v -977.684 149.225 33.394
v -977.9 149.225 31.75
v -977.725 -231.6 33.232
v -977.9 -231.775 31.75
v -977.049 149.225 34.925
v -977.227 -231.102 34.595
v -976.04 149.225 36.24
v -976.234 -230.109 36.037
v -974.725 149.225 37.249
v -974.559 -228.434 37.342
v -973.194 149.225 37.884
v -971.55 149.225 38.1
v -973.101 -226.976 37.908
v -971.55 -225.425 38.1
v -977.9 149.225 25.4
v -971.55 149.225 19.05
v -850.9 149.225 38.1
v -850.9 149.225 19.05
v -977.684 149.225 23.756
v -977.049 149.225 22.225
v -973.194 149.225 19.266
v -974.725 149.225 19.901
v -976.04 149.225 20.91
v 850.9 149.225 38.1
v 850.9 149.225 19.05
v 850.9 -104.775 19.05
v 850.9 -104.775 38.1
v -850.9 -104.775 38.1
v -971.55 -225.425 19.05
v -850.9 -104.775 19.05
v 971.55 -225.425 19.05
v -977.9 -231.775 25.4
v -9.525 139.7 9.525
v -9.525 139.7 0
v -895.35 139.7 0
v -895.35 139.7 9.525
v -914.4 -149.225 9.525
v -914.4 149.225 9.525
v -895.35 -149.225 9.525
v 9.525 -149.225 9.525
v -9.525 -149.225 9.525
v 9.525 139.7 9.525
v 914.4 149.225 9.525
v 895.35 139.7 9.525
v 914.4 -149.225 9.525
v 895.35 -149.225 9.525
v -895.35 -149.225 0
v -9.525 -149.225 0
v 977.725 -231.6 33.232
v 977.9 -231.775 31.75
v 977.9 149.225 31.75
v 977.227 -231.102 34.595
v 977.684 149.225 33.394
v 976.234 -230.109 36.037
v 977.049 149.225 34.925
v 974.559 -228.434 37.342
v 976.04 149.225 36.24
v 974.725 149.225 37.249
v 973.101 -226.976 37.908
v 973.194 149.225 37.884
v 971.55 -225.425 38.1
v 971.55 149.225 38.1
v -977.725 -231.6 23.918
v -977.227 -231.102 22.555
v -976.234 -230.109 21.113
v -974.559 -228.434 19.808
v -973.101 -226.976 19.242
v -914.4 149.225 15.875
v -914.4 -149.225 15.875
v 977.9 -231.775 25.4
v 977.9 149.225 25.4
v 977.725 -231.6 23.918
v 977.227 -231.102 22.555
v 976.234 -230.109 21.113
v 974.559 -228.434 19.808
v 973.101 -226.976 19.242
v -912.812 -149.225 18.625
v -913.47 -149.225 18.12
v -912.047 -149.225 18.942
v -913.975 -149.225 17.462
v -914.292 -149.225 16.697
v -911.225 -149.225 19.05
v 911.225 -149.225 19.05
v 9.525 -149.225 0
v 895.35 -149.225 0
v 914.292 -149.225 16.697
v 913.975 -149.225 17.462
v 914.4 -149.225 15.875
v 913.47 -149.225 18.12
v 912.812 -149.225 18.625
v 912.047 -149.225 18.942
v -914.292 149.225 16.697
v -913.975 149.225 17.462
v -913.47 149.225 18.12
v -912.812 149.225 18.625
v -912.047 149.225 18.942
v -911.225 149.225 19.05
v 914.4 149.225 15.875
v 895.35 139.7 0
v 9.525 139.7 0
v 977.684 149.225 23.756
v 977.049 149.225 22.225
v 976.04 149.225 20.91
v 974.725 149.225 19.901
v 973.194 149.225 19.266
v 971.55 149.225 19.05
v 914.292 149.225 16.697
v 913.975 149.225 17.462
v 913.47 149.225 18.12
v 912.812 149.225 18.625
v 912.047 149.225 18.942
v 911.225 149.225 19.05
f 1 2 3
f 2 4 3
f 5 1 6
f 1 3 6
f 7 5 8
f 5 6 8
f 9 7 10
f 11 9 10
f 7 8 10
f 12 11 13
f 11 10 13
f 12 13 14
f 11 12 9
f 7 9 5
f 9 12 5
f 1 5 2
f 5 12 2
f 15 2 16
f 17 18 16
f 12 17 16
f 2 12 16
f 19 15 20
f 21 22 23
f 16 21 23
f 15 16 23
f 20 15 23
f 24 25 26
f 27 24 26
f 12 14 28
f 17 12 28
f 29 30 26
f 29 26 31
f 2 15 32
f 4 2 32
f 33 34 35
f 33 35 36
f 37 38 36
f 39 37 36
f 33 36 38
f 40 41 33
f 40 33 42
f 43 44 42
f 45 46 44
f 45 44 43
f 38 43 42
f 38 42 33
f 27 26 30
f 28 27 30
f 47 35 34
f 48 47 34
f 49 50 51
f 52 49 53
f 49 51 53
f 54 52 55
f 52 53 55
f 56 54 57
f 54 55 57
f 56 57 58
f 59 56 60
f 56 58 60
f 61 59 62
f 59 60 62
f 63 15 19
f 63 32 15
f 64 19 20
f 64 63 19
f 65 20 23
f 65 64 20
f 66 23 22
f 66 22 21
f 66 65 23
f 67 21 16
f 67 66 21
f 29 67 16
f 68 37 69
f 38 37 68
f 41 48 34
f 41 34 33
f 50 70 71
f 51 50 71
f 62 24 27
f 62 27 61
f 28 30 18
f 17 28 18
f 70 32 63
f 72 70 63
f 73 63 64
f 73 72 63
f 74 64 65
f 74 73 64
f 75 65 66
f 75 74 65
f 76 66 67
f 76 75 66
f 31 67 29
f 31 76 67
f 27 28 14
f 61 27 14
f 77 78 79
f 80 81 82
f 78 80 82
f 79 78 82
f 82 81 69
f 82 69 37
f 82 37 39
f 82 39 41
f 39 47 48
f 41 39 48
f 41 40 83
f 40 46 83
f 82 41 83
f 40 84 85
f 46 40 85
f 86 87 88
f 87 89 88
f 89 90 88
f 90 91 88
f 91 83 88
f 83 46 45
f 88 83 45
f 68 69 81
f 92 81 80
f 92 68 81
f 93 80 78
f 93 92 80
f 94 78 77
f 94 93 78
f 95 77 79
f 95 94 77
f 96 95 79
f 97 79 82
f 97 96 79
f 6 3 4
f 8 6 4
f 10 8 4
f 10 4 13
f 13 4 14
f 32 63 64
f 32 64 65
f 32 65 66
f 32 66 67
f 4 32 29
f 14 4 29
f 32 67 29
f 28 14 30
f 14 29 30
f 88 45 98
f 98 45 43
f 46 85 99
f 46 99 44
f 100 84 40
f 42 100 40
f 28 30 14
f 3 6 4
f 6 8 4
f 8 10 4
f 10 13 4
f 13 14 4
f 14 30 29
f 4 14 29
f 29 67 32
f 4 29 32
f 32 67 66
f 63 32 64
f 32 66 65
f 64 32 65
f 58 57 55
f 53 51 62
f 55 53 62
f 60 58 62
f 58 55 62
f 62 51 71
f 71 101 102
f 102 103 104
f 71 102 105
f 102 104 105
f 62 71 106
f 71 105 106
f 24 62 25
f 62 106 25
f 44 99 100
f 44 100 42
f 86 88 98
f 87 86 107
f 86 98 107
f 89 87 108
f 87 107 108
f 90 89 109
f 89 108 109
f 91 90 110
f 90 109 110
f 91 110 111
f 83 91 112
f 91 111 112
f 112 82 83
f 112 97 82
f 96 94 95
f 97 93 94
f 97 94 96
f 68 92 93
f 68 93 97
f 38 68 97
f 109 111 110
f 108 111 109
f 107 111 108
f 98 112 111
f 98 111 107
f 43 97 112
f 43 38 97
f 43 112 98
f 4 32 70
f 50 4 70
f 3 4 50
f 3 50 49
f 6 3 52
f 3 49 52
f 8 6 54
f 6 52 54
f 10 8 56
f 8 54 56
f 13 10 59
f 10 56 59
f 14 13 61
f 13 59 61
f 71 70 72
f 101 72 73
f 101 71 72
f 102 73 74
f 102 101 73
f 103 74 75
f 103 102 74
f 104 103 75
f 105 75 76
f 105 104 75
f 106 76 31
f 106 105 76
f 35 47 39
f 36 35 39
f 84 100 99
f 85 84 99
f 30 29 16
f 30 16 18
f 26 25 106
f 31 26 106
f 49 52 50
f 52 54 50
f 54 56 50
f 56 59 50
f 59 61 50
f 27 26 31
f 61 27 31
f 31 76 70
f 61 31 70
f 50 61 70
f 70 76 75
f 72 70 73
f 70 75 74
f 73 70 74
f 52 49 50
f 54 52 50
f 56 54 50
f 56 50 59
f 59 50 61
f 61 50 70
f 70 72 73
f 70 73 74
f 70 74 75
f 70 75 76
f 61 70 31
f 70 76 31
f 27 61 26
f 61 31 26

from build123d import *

# Parameters (mm, degrees)
F0_W      = 1828.8
F0_H      = 298.45
F1_DEPTH  = 19.05
F2_W      = 9.525
F2_H      = 9.525
F3_DEPTH  = 1828.801
F4_W      = 19.05
F4_H      = 9.525
F5_DEPTH  = 298.451
F7_DEPTH  = 19.05
F9_DEPTH  = 19.05
F11_DEPTH = 19.05
F12_R     = 6.35
F12_2_R   = 6.35
F12_3_R   = 6.35
F13_R     = 3.175


with BuildPart() as f1:
    # F0 (on Top) → F1 (new body)
    with BuildSketch(Plane.XY):
        Rectangle(F0_W, F0_H)
    extrude(amount=F1_DEPTH)

    # F2 (on face) → F3 (cut, through all)
    with BuildSketch(Plane.YZ.offset(914.4)):
        with Locations((144.4625, 4.7625)):
            Rectangle(F2_W, F2_H)
    extrude(amount=-F3_DEPTH, mode=Mode.SUBTRACT)

    # F4 (on face) → F5 (cut, through all)
    with BuildSketch(Plane.XZ.offset(149.225)):
        with Locations((-904.875, 4.7625)):
            Rectangle(F4_W, F4_H)
        with Locations((904.875, 4.7625)):
            Rectangle(F4_W, F4_H)
        with Locations((0, 4.7625)):
            Rectangle(F4_W, F4_H)
    extrude(amount=-F5_DEPTH, mode=Mode.SUBTRACT)

    # F13
    f13_edges = [f1.edges().sort_by_distance(p)[0] for p in [
        (-914.4, 0, 19.05),
        (914.4, 0, 19.05),
    ]]
    fillet(f13_edges, radius=F13_R)


with BuildPart() as f7:
    # F6 (on face) → F7 (new body)
    with BuildSketch(Plane.XY.offset(19.05)):
        Polygon((850.9, -104.775), (-850.9, -104.775), (-977.9, -231.775), (977.9, -231.775), align=None)
    extrude(amount=F7_DEPTH)

    # F12
    f12_edges = [f7.edges().sort_by_distance(p)[0] for p in [
        (0, -231.775, 38.1),
        (0, -231.775, 19.05),
    ]]
    fillet(f12_edges, radius=F12_R)


with BuildPart() as f9:
    # F8 (on face) → F9 (new body)
    with BuildSketch(Plane.XY.offset(19.05)):
        Polygon((-850.9, 149.225), (-977.9, 149.225), (-977.9, -231.775), (-850.9, -104.775), align=None)
    extrude(amount=F9_DEPTH)

    # F12#3
    f12_3_edges = [f9.edges().sort_by_distance(p)[0] for p in [
        (-977.9, -41.275, 38.1),
        (-977.9, -41.275, 19.05),
    ]]
    fillet(f12_3_edges, radius=F12_3_R)


with BuildPart() as f11:
    # F10 (on face) → F11 (new body)
    with BuildSketch(Plane.XY.offset(19.05)):
        Polygon((977.9, 149.225), (850.9, 149.225), (850.9, -104.775), (977.9, -231.775), align=None)
    extrude(amount=F11_DEPTH)

    # F12#2
    f12_2_edges = [f11.edges().sort_by_distance(p)[0] for p in [
        (977.9, -41.275, 19.05),
        (977.9, -41.275, 38.1),
    ]]
    fillet(f12_2_edges, radius=F12_2_R)


solid = Compound([f1.part, f7.part, f9.part, f11.part])
